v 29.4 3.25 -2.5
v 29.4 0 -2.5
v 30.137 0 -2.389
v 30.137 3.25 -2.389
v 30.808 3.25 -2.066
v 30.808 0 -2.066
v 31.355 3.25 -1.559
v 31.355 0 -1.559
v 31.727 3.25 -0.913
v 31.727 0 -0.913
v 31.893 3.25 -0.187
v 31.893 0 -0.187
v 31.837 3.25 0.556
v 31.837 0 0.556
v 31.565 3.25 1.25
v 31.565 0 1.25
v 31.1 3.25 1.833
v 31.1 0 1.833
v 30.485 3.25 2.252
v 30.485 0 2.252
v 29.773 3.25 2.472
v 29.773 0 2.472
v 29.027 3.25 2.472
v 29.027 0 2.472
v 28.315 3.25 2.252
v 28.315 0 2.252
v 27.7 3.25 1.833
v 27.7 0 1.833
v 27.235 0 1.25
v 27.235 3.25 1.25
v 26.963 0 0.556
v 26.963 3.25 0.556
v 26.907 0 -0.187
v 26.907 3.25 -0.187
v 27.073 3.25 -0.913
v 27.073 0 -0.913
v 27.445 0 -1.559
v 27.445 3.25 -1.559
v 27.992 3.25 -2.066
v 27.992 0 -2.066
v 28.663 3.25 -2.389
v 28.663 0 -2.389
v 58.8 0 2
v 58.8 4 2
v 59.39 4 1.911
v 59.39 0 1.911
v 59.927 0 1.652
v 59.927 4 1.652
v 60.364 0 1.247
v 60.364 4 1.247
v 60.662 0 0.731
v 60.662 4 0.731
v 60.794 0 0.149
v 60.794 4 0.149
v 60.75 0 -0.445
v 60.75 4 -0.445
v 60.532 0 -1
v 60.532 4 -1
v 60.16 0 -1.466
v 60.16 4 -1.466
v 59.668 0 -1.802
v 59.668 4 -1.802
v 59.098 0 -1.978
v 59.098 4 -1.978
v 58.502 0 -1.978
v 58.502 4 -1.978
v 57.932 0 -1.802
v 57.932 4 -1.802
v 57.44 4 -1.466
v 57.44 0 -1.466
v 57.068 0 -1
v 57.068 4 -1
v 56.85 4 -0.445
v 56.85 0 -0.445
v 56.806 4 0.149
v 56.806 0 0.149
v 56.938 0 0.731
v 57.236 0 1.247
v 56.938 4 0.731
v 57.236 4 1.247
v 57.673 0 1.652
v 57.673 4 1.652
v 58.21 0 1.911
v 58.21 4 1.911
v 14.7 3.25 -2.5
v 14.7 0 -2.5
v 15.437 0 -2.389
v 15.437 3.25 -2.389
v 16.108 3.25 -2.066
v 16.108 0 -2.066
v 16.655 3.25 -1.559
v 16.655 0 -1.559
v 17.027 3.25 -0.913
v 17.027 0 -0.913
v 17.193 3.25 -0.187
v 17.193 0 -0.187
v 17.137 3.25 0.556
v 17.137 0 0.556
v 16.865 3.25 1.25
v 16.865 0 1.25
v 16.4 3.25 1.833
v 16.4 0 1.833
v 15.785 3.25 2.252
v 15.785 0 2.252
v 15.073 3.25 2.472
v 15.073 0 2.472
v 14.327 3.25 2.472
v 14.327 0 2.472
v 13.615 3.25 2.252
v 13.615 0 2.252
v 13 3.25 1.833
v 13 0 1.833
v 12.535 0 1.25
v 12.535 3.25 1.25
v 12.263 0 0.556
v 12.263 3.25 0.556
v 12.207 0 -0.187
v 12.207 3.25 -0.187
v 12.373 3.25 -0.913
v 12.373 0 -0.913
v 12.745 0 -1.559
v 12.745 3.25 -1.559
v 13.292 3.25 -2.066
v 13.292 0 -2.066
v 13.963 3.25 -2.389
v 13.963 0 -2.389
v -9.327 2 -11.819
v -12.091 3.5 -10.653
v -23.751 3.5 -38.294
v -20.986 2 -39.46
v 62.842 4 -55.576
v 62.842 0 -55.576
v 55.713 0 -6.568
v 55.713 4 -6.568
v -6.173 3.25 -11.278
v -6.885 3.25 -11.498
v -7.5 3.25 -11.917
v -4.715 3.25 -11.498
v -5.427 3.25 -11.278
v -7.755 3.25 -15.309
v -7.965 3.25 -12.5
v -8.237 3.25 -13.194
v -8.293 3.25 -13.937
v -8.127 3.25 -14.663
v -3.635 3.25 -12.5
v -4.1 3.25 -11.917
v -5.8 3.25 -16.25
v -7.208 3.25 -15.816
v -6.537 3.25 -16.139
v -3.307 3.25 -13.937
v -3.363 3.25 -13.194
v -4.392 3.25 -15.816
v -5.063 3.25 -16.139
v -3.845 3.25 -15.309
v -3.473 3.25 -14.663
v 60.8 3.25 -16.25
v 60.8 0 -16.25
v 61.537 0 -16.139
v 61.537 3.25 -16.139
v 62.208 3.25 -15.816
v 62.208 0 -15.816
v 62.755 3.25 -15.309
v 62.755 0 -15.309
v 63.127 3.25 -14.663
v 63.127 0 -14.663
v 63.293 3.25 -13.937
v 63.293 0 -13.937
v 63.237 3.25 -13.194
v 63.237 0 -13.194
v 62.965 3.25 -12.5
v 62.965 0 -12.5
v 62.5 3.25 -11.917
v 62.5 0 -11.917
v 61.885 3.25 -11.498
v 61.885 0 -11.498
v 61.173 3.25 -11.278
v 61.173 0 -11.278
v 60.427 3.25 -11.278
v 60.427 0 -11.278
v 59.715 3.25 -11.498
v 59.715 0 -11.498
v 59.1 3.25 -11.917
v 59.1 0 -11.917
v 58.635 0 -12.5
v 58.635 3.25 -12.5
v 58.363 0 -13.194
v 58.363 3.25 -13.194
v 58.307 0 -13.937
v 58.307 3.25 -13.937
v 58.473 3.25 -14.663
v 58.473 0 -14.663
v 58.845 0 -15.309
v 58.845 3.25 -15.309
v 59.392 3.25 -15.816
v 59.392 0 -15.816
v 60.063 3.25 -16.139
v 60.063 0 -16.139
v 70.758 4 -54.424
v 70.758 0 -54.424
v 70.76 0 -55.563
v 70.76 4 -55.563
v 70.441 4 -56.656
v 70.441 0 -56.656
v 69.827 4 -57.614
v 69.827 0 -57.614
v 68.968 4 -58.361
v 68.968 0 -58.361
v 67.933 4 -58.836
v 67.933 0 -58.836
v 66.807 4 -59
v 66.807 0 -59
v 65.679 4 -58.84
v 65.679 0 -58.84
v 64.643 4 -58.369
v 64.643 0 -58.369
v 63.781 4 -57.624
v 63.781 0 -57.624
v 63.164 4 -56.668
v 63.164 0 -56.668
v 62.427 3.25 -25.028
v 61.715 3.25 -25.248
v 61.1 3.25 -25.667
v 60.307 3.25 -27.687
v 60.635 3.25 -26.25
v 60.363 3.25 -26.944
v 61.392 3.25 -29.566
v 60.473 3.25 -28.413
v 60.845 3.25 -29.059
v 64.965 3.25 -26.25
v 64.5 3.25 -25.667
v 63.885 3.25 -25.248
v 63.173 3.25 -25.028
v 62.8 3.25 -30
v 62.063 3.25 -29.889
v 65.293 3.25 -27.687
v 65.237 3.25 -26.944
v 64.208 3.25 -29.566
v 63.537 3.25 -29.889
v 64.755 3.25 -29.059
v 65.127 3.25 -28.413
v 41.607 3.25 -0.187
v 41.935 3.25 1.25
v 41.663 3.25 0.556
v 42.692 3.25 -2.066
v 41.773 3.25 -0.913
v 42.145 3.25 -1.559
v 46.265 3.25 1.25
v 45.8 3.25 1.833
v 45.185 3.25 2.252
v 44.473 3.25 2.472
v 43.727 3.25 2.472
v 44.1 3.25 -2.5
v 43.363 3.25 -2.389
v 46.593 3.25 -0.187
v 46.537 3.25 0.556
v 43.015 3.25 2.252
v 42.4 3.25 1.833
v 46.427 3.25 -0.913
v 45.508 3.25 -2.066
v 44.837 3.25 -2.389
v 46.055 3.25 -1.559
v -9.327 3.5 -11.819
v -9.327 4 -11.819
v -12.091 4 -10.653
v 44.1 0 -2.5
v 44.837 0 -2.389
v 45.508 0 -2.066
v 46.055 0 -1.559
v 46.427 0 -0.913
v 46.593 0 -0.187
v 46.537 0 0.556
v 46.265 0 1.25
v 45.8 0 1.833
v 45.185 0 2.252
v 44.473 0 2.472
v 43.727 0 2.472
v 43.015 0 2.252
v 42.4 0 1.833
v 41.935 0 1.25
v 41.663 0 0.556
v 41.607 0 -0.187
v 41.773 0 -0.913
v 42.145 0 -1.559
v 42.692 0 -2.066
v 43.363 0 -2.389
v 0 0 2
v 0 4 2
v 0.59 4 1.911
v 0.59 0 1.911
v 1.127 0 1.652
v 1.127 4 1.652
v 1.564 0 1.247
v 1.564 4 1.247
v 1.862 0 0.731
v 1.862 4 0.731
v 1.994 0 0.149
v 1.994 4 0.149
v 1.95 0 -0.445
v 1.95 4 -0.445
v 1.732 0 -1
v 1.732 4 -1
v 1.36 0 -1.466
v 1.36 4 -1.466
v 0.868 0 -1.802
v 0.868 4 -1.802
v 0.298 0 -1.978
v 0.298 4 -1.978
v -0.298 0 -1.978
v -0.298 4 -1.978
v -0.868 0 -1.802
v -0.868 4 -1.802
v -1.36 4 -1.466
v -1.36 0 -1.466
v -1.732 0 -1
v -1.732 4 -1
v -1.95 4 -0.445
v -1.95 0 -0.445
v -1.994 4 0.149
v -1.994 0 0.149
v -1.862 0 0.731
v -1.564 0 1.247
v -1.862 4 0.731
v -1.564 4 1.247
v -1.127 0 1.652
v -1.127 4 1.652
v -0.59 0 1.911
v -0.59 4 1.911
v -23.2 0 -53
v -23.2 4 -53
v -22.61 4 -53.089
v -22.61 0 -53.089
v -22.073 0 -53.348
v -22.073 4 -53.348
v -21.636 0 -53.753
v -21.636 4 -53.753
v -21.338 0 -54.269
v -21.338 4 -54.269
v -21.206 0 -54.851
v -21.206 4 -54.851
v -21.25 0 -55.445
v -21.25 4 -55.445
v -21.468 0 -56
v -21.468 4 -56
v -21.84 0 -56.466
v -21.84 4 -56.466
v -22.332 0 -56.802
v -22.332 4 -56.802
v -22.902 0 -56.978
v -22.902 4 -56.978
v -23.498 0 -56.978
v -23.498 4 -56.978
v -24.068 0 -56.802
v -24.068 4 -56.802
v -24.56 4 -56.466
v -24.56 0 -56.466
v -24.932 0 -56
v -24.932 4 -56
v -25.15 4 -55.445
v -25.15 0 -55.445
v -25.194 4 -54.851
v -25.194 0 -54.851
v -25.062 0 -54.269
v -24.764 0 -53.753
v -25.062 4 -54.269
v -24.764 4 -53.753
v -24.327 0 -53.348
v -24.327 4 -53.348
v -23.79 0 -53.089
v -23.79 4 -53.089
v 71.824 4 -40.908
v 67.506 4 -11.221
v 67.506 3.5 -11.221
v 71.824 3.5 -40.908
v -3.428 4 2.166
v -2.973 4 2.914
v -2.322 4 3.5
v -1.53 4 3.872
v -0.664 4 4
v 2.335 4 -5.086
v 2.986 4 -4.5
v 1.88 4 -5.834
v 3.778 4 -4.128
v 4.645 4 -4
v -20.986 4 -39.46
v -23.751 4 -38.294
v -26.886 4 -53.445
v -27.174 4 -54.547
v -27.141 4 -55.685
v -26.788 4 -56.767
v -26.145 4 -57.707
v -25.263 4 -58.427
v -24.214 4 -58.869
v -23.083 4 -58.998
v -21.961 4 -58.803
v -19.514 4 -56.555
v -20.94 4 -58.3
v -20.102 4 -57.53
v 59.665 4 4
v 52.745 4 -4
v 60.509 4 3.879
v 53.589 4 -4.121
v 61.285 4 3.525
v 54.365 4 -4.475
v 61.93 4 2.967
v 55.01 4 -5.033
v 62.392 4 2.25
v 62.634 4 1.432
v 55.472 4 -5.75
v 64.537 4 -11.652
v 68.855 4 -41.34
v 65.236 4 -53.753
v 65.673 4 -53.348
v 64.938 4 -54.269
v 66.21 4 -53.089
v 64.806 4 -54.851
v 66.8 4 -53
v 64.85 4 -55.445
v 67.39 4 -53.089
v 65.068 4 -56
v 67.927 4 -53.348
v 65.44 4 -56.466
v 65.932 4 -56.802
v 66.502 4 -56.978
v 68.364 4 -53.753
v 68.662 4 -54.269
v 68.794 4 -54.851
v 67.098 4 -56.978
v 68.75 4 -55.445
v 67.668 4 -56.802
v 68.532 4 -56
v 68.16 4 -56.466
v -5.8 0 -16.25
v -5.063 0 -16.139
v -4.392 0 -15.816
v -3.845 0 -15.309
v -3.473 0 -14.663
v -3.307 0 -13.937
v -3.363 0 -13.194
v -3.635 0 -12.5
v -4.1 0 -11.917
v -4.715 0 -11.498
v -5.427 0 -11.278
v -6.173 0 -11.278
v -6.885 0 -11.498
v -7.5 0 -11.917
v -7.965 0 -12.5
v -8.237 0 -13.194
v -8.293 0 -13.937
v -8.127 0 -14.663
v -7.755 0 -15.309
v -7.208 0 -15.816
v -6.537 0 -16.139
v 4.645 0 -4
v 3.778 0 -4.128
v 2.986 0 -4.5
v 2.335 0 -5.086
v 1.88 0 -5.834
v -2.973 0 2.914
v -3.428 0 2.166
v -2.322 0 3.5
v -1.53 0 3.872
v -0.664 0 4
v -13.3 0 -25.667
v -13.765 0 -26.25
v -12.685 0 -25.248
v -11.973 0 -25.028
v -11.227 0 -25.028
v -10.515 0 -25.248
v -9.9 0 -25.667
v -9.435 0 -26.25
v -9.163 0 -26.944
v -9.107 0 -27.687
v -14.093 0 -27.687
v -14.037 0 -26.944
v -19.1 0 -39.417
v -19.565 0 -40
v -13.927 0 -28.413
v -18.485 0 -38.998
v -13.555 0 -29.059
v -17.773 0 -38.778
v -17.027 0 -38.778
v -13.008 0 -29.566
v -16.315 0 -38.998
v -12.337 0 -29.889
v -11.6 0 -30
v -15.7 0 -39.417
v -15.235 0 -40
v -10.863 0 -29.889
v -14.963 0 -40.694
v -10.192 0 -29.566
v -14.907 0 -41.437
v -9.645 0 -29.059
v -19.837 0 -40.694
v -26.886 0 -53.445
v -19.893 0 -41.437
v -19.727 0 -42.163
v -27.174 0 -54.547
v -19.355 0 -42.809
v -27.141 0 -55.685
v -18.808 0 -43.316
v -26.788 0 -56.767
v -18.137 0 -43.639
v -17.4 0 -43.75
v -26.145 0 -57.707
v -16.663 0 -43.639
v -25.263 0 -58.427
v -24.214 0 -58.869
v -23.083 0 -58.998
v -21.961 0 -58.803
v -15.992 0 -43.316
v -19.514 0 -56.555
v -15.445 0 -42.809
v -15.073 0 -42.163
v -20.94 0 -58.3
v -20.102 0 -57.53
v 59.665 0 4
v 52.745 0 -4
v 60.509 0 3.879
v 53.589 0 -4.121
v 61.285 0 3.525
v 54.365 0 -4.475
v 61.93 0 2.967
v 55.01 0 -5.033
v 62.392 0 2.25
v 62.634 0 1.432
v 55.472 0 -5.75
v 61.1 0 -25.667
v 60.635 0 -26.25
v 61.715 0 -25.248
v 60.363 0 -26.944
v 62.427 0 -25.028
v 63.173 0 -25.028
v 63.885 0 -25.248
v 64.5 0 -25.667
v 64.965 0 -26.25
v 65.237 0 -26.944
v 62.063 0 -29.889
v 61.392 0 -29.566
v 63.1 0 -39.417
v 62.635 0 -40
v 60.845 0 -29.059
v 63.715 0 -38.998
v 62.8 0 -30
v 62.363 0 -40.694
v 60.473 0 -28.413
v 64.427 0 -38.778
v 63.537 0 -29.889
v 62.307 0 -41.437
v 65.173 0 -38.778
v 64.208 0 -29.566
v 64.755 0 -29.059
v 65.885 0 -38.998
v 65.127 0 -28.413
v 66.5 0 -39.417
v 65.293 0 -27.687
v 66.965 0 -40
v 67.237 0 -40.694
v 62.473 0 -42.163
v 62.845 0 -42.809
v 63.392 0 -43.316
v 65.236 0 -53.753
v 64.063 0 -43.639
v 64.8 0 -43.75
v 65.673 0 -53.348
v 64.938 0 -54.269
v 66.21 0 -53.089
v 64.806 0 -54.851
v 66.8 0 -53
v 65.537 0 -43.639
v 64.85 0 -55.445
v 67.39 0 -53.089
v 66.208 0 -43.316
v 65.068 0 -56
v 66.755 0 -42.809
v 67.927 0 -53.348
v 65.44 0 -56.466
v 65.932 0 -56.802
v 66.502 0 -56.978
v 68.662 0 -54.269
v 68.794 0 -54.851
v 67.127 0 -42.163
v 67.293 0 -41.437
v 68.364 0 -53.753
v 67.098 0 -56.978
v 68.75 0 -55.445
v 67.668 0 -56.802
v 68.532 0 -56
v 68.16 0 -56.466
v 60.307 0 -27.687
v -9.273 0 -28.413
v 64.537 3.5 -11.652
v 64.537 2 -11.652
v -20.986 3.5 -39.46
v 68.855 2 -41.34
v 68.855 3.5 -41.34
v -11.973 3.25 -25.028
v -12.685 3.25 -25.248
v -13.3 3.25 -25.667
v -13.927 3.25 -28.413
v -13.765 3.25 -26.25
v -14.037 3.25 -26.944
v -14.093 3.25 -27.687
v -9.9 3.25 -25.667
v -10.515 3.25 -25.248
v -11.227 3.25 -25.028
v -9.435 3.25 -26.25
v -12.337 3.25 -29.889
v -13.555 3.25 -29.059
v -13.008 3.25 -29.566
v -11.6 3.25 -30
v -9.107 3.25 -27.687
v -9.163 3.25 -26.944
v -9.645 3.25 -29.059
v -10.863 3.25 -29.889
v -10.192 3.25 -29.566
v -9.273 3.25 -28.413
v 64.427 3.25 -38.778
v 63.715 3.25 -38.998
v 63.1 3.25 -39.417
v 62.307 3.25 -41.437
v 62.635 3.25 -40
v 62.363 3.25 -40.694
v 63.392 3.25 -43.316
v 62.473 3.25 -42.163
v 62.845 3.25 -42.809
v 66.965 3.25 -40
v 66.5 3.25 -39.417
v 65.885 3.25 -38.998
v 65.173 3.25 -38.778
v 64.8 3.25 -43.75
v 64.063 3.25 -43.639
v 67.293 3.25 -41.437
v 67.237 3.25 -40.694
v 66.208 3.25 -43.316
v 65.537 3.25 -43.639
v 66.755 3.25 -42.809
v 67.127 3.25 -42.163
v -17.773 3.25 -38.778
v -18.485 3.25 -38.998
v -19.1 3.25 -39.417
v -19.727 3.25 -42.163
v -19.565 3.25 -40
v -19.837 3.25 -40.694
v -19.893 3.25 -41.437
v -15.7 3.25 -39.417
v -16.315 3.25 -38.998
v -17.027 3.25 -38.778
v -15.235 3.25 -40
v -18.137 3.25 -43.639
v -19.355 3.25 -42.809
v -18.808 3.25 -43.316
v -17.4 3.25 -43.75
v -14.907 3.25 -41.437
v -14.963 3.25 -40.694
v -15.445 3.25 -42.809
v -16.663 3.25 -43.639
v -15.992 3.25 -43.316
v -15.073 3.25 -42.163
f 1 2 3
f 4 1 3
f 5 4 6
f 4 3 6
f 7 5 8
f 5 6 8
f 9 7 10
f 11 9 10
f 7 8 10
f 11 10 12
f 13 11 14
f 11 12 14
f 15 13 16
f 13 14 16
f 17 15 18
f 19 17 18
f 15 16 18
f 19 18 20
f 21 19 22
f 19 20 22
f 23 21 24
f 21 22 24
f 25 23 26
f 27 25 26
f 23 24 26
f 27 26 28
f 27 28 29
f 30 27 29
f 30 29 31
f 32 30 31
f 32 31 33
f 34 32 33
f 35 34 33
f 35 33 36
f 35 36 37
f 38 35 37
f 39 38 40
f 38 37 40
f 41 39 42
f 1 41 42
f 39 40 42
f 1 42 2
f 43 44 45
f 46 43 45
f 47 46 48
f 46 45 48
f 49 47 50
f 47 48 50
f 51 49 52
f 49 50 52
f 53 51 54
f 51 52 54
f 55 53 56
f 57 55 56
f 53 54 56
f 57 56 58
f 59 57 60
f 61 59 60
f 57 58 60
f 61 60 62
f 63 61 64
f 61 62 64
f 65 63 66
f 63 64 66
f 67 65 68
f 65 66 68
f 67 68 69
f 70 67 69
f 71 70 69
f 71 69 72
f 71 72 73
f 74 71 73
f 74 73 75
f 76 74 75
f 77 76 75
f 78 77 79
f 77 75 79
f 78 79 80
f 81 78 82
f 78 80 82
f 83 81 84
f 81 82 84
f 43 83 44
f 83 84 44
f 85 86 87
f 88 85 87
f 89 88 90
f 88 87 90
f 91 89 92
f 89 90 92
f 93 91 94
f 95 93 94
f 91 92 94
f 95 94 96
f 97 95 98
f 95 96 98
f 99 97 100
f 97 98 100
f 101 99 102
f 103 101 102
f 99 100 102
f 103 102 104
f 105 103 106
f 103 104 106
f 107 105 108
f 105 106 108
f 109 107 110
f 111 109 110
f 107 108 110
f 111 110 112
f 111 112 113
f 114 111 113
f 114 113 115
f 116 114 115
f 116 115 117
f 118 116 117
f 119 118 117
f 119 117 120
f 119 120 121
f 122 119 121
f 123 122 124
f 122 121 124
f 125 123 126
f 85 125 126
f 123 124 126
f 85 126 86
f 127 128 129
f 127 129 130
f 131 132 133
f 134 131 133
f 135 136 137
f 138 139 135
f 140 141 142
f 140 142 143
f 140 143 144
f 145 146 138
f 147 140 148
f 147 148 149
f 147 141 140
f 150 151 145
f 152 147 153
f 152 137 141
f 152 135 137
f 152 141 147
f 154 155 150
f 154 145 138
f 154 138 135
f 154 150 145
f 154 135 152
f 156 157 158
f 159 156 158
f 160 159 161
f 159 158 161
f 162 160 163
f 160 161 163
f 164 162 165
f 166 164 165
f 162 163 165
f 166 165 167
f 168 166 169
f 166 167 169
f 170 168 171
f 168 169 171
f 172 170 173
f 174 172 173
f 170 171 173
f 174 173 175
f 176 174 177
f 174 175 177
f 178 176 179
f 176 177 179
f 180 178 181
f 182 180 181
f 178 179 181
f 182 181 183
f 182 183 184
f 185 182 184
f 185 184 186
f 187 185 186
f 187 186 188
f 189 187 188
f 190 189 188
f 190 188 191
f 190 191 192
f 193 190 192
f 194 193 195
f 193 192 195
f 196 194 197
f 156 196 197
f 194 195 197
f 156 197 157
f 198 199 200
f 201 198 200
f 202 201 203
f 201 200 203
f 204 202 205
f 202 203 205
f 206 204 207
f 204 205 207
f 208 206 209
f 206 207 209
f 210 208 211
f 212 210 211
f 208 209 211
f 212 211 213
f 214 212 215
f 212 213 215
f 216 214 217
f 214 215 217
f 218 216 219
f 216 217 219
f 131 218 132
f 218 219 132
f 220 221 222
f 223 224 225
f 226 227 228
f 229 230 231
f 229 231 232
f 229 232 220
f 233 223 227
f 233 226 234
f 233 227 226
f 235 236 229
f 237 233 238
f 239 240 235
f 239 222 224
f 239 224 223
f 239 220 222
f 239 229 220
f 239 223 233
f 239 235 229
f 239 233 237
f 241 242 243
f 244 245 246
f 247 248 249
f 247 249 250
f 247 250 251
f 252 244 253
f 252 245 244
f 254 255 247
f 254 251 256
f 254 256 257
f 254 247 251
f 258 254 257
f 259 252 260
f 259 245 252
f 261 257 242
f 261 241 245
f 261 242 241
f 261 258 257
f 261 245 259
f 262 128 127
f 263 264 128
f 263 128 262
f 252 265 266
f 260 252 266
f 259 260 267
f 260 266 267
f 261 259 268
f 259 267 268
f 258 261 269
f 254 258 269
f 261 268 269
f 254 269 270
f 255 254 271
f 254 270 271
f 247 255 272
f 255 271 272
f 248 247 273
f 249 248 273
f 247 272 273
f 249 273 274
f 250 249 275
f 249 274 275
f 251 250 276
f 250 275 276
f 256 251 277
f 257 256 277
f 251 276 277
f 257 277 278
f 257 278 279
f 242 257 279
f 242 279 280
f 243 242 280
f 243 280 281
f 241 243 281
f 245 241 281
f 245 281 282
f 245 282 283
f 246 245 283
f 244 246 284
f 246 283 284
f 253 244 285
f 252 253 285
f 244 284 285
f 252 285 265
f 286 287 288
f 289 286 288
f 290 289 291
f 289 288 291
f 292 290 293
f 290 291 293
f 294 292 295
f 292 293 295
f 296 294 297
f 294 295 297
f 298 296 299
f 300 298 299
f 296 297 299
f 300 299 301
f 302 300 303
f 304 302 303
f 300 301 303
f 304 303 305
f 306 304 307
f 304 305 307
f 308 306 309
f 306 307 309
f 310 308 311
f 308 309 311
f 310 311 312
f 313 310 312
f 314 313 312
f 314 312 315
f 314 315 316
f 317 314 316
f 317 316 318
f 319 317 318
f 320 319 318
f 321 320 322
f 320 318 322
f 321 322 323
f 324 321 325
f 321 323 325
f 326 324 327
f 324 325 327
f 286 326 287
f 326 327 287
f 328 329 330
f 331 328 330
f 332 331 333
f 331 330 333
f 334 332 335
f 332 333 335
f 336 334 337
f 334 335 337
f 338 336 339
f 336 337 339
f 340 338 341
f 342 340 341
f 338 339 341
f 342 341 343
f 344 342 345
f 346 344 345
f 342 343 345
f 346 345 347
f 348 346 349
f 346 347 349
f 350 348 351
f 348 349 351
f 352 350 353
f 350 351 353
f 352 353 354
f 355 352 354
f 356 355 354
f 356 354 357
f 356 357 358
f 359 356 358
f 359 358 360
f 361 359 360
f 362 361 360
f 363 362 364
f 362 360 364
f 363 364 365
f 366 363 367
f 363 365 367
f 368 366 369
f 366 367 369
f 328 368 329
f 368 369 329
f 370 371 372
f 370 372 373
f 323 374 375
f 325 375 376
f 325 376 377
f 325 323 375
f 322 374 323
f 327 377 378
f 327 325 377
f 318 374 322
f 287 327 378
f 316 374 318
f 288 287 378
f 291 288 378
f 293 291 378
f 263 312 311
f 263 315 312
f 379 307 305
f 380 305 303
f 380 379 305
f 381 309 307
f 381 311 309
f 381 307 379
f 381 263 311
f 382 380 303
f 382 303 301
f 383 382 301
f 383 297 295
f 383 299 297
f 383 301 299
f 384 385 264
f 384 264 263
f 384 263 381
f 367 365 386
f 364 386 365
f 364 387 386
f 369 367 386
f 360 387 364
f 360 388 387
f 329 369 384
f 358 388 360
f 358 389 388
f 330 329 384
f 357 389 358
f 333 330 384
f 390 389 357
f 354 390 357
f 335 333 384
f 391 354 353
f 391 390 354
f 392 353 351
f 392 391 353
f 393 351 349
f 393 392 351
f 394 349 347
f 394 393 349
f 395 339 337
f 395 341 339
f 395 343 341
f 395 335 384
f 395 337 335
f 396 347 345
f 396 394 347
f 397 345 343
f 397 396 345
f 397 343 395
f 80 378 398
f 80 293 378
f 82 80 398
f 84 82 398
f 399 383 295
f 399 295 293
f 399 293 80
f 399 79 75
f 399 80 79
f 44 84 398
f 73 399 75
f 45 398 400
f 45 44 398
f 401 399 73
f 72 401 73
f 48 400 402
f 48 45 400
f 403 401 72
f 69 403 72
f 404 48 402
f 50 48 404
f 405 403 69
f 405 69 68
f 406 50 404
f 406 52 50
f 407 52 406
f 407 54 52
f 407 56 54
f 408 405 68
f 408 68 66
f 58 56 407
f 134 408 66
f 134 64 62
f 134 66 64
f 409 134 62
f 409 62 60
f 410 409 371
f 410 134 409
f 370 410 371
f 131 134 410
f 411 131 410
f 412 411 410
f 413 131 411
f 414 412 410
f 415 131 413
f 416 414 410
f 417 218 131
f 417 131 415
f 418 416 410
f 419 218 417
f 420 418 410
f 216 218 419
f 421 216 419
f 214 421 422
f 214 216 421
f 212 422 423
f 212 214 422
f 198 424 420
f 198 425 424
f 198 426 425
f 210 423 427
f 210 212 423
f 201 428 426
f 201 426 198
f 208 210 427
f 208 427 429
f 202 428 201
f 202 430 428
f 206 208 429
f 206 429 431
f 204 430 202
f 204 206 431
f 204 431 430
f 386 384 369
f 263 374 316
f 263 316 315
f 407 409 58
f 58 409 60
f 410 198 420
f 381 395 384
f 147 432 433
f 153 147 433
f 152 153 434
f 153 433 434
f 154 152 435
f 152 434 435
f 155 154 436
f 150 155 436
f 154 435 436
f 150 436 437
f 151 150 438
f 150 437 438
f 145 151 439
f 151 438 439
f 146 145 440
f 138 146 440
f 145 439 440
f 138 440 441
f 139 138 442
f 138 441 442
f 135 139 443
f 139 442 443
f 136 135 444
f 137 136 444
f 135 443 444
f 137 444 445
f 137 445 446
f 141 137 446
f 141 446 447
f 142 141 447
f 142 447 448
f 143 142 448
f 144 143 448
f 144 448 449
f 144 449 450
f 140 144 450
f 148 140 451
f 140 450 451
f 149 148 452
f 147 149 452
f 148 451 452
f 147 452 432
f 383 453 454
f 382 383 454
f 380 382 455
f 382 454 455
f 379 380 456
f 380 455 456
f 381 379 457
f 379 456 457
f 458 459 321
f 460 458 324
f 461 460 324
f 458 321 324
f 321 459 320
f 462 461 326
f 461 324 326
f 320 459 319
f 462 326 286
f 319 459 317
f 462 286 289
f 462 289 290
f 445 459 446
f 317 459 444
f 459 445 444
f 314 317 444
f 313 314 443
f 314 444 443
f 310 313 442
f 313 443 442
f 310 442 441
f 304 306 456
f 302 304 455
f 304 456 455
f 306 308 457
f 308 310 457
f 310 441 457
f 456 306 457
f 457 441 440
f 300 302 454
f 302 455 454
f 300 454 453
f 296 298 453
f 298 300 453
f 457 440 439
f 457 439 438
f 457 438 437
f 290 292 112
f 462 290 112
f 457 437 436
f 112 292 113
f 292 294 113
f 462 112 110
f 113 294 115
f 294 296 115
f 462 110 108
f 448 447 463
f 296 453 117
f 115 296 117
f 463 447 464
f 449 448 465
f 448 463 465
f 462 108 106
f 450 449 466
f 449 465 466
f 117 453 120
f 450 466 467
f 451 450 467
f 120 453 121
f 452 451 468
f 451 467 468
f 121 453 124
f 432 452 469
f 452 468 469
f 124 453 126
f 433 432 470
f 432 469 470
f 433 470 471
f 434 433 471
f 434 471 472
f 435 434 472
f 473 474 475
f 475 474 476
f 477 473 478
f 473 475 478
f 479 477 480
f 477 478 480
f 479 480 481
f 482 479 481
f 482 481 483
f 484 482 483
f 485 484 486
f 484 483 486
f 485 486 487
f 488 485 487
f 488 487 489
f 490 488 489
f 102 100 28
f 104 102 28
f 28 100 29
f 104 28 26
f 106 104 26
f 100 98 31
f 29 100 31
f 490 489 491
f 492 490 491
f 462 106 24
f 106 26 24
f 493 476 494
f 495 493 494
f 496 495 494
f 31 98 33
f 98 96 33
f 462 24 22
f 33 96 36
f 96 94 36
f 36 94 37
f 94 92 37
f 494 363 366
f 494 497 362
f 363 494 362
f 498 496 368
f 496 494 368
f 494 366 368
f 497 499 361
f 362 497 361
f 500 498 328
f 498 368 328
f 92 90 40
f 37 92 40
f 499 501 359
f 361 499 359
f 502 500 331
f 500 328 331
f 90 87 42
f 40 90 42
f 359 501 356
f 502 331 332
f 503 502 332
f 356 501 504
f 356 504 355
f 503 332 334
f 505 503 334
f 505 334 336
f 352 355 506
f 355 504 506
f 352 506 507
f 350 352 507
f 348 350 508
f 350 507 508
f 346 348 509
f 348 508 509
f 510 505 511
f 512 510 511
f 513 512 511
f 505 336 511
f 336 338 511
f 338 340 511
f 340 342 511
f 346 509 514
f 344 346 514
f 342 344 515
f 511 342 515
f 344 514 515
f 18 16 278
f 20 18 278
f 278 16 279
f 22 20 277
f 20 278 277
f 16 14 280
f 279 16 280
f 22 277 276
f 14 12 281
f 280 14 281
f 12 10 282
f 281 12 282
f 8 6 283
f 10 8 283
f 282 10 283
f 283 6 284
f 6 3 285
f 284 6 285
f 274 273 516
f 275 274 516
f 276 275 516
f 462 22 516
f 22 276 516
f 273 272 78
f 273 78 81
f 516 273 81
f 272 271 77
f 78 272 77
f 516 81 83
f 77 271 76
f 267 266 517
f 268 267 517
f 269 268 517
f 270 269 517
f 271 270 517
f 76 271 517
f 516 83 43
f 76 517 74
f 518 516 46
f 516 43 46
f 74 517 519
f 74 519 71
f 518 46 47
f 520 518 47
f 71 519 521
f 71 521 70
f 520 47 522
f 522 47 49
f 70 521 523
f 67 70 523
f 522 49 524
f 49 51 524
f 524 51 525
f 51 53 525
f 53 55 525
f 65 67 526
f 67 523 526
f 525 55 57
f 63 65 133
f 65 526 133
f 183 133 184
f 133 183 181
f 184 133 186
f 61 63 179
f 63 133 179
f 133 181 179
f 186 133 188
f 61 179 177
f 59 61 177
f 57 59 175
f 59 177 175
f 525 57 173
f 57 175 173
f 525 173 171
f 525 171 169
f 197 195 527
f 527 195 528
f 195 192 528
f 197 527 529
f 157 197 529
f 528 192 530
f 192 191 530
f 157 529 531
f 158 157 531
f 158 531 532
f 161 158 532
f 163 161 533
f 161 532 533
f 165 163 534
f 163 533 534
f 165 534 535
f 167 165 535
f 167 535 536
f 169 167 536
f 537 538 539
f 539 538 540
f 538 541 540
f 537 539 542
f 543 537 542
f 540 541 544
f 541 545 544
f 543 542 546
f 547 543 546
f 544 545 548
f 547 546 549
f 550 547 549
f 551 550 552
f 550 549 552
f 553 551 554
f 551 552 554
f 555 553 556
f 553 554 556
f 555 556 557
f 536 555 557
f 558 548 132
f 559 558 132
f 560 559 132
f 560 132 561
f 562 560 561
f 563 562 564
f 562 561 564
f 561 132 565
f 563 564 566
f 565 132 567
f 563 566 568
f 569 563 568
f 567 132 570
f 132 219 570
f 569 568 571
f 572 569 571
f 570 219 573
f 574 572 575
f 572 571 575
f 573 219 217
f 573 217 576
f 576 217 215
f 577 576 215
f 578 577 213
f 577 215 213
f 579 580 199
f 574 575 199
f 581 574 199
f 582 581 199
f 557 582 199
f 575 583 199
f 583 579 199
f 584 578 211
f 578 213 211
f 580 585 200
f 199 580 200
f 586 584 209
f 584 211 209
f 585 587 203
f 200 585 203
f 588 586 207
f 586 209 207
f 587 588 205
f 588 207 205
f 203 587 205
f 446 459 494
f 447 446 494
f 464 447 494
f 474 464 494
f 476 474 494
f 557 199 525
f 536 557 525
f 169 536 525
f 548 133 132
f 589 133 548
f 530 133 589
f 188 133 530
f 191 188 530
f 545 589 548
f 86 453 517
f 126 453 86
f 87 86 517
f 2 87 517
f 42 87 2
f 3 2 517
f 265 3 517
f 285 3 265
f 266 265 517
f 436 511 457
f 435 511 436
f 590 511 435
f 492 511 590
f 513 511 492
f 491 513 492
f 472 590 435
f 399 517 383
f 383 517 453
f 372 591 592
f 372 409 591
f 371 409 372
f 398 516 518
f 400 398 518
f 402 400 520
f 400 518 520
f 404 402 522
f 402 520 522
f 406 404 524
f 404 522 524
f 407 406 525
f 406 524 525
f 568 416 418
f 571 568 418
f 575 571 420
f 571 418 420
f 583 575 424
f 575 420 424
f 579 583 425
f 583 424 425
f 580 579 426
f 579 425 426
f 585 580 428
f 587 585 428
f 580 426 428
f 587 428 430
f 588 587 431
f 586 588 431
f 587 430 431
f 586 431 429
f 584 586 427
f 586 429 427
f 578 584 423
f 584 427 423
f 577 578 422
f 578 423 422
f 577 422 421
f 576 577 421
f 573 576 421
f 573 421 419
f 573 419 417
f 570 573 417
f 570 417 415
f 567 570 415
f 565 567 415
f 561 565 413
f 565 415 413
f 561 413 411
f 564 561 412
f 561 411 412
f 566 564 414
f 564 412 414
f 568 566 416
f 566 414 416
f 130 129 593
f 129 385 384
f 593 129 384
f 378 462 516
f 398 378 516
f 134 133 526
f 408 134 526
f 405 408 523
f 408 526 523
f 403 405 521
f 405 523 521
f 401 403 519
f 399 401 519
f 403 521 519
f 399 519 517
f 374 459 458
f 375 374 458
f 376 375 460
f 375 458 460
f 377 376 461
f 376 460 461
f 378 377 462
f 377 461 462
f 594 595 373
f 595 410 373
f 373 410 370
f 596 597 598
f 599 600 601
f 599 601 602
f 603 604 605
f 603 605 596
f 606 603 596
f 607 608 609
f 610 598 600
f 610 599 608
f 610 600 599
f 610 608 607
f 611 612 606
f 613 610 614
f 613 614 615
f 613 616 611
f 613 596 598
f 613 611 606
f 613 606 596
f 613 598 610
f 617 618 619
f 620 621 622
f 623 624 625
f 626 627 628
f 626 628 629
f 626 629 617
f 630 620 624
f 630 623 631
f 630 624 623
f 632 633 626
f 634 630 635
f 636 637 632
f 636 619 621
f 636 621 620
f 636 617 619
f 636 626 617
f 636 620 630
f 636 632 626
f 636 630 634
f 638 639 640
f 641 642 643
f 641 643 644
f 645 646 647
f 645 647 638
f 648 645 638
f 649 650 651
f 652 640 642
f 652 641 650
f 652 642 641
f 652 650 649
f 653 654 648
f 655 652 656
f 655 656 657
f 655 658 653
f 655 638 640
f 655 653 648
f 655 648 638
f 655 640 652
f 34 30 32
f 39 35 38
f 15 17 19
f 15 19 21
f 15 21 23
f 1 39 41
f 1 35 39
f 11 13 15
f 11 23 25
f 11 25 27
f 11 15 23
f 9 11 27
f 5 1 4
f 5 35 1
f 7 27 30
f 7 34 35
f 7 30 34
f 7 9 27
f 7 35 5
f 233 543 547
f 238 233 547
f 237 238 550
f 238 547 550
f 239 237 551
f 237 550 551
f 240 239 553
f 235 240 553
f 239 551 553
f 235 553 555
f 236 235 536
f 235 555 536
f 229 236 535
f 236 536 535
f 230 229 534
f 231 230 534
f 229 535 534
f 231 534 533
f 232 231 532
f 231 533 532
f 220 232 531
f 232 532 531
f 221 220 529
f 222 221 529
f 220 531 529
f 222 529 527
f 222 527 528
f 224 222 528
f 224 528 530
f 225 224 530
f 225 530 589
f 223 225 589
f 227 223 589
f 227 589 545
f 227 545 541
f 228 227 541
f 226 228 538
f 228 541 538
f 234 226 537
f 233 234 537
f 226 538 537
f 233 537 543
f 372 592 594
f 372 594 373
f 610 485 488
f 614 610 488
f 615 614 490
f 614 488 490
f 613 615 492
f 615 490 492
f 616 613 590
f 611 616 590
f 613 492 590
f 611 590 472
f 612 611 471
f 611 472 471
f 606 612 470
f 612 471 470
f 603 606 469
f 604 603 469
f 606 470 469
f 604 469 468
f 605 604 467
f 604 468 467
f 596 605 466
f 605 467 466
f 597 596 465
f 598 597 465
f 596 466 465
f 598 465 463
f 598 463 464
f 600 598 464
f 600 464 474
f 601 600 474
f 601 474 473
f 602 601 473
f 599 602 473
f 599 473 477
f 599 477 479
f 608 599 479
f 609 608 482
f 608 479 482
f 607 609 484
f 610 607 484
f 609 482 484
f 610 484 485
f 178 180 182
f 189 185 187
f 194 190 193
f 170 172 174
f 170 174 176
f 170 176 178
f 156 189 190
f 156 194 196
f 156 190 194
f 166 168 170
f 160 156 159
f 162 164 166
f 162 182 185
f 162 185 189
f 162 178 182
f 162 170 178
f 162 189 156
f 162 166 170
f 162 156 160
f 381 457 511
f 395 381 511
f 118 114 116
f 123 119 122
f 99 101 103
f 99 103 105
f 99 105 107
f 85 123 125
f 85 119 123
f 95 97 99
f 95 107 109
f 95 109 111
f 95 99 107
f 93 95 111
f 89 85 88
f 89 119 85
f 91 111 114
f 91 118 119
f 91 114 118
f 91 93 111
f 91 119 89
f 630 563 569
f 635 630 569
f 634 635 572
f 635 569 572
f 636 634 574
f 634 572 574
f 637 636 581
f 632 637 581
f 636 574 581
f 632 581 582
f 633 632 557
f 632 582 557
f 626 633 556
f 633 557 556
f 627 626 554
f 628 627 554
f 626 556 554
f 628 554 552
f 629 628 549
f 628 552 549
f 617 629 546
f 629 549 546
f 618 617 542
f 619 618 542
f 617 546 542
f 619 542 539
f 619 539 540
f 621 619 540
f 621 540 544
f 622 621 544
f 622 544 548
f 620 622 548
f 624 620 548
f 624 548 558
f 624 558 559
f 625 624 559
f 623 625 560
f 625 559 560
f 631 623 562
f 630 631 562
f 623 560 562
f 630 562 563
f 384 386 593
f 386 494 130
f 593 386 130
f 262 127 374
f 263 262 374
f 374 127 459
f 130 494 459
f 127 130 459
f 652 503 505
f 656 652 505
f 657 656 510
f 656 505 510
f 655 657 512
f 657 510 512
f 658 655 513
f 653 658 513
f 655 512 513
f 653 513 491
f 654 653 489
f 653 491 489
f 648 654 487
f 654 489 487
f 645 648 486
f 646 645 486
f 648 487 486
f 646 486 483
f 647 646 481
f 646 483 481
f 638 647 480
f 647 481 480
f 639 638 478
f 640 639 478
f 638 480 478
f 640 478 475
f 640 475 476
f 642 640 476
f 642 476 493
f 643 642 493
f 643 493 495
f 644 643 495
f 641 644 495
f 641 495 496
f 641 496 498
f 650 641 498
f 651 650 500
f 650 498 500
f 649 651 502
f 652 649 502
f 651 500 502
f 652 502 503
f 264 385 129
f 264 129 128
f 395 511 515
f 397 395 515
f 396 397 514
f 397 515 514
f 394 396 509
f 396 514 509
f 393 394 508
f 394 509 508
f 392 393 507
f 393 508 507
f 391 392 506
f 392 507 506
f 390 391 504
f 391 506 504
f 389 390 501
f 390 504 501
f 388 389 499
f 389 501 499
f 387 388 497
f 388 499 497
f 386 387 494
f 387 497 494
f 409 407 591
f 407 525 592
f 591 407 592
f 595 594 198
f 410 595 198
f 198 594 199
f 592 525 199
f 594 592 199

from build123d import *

# Parameters (mm, degrees)
BOSS_EXTRUDE1_DEPTH = 4
SKETCH5_R           = 2.5
CUT_EXTRUDE1_DEPTH  = 3.25
SKETCH6_W           = 30
SKETCH6_H           = 0.5
BOSS_EXTRUDE2_DEPTH = 3
BOSS_EXTRUDE3_DEPTH = 30
SKETCH8_W           = 30
SKETCH8_H           = 0.5
BOSS_EXTRUDE4_DEPTH = 3
BOSS_EXTRUDE5_DEPTH = 30
SKETCH10_R          = 2
CUT_EXTRUDE2_DEPTH  = 4


# Read off the part's stored shape, not the designer's step: M3x0.5 Tapped Hole1
with BuildPart() as part:
    # Sketch1 → Boss-Extrude1 (new body)
    with BuildSketch(Plane(origin=(0, 0, 0), x_dir=(1, 0, 0), z_dir=(0, 1, 0))):
        with BuildLine():
            Line((-26.885531635, 53.445375747), (-3.427655647, -2.16596819))
            ThreePointArc((-3.427655647, -2.16596819), (-2.322135184, -3.499790448), (-0.663506921, -4))
            Line((-0.663506921, -4), (59.665068599, -4))
            ThreePointArc((59.665068599, -4), (61.627788827, -3.268860795), (62.633827917, -1.431819537))
            Line((62.633827917, -1.431819537), (70.758345757, 54.424240617))
            ThreePointArc((70.758345757, 54.424240617), (67.375759383, 58.958345757), (62.841654243, 55.575759383))
            Line((62.841654243, 55.575759383), (55.713279127, 6.568180463))
            ThreePointArc((55.713279127, 6.568180463), (54.707240038, 4.731139205), (52.744519809, 4))
            Line((52.744519809, 4), (4.644548446, 4))
            ThreePointArc((4.644548446, 4), (2.985920183, 4.500209552), (1.88039972, 5.83403181))
            Line((1.88039972, 5.83403181), (-19.514468365, 56.554624253))
            ThreePointArc((-19.514468365, 56.554624253), (-24.754624253, 58.685531635), (-26.885531635, 53.445375747))
        make_face()
    extrude(amount=BOSS_EXTRUDE1_DEPTH)

    # M3x0.5 Tapped Hole1 outline → M3x0.5 Tapped Hole1 (revolve, cut)
    with BuildSketch(Plane(origin=(-23.2, 0, -55), x_dir=(1, 0, 0), z_dir=(0, 0, 1))):
        Polygon((0, 0), (1.25, 0), (1.25, 3.725), (1.525, 4), (0, 4), align=None)
    revolve(axis=Axis((-23.2, 0, -55), (0, 1, 0)), mode=Mode.SUBTRACT)

    # M3x0.5 Tapped Hole1 2 outline → M3x0.5 Tapped Hole1 2 (revolve, cut)
    with BuildSketch(Plane.XY):
        Polygon((0, 0), (1.25, 0), (1.25, 3.725), (1.525, 4), (0, 4), align=None)
    revolve(axis=Axis((0, 0, 0), (0, 1, 0)), mode=Mode.SUBTRACT)

    # M3x0.5 Tapped Hole1 3 outline → M3x0.5 Tapped Hole1 3 (revolve, cut)
    with BuildSketch(Plane(origin=(58.8, 0, 0), x_dir=(1, 0, 0), z_dir=(0, 0, 1))):
        Polygon((0, 0), (1.25, 0), (1.25, 3.725), (1.525, 4), (0, 4), align=None)
    revolve(axis=Axis((58.8, 0, 0), (0, 1, 0)), mode=Mode.SUBTRACT)

    # M3x0.5 Tapped Hole1 4 outline → M3x0.5 Tapped Hole1 4 (revolve, cut)
    with BuildSketch(Plane(origin=(66.8, 0, -55), x_dir=(1, 0, 0), z_dir=(0, 0, 1))):
        Polygon((0, 0), (1.25, 0), (1.25, 3.725), (1.525, 4), (0, 4), align=None)
    revolve(axis=Axis((66.8, 0, -55), (0, 1, 0)), mode=Mode.SUBTRACT)

    # Sketch5 → Cut-Extrude1 (cut)
    with BuildSketch(Plane.XZ):
        with Locations(Location((-17.4, -41.25, 0), (0, 0, 270))):
            Circle(SKETCH5_R)
        with Locations(Location((29.4, 0, 0), (0, 0, 270))):
            Circle(SKETCH5_R)
        with Locations(Location((60.8, -13.75, 0), (0, 0, 270))):
            Circle(SKETCH5_R)
        with Locations(Location((-5.8, -13.75, 0), (0, 0, 270))):
            Circle(SKETCH5_R)
        with Locations(Location((64.8, -41.25, 0), (0, 0, 270))):
            Circle(SKETCH5_R)
        with Locations(Location((-11.6, -27.5, 0), (0, 0, 270))):
            Circle(SKETCH5_R)
        with Locations(Location((14.7, 0, 0), (0, 0, 270))):
            Circle(SKETCH5_R)
        with Locations(Location((44.1, 0, 0), (0, 0, 270))):
            Circle(SKETCH5_R)
        with Locations(Location((62.8, -27.5, 0), (0, 0, 270))):
            Circle(SKETCH5_R)
    extrude(amount=-CUT_EXTRUDE1_DEPTH, mode=Mode.SUBTRACT)

    # Sketch6 → Boss-Extrude2 (add)
    with BuildSketch(Plane(origin=(-3.685531635, 0, 1.554624253), x_dir=(0.38865606330829405, 0, 0.921382908705007), z_dir=(-0.921382908705007, 0, 0.38865606330829405))):
        with Locations((-29.514686863, 3.75)):
            Rectangle(SKETCH6_W, SKETCH6_H)
    extrude(amount=BOSS_EXTRUDE2_DEPTH)

    # Sketch7 → Boss-Extrude3 (add)
    with BuildSketch(Plane(origin=(-5.641221056, 0, -13.373584401), x_dir=(0.9213829087050069, 0, -0.3886560633082941), z_dir=(0.3886560633082942, 0, 0.921382908705007))):
        Polygon((-4, 2), (-4, 3.5), (-7, 3.5), align=None)
    extrude(amount=-BOSS_EXTRUDE3_DEPTH)

    # Sketch8 → Boss-Extrude4 (add)
    with BuildSketch(Plane(origin=(61.540087421, 0, 8.951285443), x_dir=(0.14393984571411056, 0, -0.9895864392845114), z_dir=(0.9895864392845114, 0, 0.14393984571411056))):
        with Locations((35.820515092, 3.75)):
            Rectangle(SKETCH8_W, SKETCH8_H)
    extrude(amount=BOSS_EXTRUDE4_DEPTH)

    # Sketch9 → Boss-Extrude5 (add)
    with BuildSketch(Plane(origin=(2.99690173, 0, -20.603699394), x_dir=(0.9895864392845114, 0, 0.14393984571411056), z_dir=(-0.14393984571411056, 0, 0.9895864392845114))):
        Polygon((65.18768263, 3.5), (62.18768263, 3.5), (62.18768263, 2), align=None)
    extrude(amount=-BOSS_EXTRUDE5_DEPTH)

    # Sketch10 → Cut-Extrude2 (cut)
    with BuildSketch(Plane(origin=(0, 4, 0), x_dir=(1, 0, 0), z_dir=(0, 1, 0))):
        with Locations(Location((-23.2, 55, 0), (0, 0, 270))):
            Circle(SKETCH10_R)
        with Locations(Location((0, 0, 0), (0, 0, 270))):
            Circle(SKETCH10_R)
        with Locations(Location((58.8, 0, 0), (0, 0, 270))):
            Circle(SKETCH10_R)
        with Locations(Location((66.8, 55, 0), (0, 0, 270))):
            Circle(SKETCH10_R)
    extrude(amount=-CUT_EXTRUDE2_DEPTH, mode=Mode.SUBTRACT)


solid = part.part
